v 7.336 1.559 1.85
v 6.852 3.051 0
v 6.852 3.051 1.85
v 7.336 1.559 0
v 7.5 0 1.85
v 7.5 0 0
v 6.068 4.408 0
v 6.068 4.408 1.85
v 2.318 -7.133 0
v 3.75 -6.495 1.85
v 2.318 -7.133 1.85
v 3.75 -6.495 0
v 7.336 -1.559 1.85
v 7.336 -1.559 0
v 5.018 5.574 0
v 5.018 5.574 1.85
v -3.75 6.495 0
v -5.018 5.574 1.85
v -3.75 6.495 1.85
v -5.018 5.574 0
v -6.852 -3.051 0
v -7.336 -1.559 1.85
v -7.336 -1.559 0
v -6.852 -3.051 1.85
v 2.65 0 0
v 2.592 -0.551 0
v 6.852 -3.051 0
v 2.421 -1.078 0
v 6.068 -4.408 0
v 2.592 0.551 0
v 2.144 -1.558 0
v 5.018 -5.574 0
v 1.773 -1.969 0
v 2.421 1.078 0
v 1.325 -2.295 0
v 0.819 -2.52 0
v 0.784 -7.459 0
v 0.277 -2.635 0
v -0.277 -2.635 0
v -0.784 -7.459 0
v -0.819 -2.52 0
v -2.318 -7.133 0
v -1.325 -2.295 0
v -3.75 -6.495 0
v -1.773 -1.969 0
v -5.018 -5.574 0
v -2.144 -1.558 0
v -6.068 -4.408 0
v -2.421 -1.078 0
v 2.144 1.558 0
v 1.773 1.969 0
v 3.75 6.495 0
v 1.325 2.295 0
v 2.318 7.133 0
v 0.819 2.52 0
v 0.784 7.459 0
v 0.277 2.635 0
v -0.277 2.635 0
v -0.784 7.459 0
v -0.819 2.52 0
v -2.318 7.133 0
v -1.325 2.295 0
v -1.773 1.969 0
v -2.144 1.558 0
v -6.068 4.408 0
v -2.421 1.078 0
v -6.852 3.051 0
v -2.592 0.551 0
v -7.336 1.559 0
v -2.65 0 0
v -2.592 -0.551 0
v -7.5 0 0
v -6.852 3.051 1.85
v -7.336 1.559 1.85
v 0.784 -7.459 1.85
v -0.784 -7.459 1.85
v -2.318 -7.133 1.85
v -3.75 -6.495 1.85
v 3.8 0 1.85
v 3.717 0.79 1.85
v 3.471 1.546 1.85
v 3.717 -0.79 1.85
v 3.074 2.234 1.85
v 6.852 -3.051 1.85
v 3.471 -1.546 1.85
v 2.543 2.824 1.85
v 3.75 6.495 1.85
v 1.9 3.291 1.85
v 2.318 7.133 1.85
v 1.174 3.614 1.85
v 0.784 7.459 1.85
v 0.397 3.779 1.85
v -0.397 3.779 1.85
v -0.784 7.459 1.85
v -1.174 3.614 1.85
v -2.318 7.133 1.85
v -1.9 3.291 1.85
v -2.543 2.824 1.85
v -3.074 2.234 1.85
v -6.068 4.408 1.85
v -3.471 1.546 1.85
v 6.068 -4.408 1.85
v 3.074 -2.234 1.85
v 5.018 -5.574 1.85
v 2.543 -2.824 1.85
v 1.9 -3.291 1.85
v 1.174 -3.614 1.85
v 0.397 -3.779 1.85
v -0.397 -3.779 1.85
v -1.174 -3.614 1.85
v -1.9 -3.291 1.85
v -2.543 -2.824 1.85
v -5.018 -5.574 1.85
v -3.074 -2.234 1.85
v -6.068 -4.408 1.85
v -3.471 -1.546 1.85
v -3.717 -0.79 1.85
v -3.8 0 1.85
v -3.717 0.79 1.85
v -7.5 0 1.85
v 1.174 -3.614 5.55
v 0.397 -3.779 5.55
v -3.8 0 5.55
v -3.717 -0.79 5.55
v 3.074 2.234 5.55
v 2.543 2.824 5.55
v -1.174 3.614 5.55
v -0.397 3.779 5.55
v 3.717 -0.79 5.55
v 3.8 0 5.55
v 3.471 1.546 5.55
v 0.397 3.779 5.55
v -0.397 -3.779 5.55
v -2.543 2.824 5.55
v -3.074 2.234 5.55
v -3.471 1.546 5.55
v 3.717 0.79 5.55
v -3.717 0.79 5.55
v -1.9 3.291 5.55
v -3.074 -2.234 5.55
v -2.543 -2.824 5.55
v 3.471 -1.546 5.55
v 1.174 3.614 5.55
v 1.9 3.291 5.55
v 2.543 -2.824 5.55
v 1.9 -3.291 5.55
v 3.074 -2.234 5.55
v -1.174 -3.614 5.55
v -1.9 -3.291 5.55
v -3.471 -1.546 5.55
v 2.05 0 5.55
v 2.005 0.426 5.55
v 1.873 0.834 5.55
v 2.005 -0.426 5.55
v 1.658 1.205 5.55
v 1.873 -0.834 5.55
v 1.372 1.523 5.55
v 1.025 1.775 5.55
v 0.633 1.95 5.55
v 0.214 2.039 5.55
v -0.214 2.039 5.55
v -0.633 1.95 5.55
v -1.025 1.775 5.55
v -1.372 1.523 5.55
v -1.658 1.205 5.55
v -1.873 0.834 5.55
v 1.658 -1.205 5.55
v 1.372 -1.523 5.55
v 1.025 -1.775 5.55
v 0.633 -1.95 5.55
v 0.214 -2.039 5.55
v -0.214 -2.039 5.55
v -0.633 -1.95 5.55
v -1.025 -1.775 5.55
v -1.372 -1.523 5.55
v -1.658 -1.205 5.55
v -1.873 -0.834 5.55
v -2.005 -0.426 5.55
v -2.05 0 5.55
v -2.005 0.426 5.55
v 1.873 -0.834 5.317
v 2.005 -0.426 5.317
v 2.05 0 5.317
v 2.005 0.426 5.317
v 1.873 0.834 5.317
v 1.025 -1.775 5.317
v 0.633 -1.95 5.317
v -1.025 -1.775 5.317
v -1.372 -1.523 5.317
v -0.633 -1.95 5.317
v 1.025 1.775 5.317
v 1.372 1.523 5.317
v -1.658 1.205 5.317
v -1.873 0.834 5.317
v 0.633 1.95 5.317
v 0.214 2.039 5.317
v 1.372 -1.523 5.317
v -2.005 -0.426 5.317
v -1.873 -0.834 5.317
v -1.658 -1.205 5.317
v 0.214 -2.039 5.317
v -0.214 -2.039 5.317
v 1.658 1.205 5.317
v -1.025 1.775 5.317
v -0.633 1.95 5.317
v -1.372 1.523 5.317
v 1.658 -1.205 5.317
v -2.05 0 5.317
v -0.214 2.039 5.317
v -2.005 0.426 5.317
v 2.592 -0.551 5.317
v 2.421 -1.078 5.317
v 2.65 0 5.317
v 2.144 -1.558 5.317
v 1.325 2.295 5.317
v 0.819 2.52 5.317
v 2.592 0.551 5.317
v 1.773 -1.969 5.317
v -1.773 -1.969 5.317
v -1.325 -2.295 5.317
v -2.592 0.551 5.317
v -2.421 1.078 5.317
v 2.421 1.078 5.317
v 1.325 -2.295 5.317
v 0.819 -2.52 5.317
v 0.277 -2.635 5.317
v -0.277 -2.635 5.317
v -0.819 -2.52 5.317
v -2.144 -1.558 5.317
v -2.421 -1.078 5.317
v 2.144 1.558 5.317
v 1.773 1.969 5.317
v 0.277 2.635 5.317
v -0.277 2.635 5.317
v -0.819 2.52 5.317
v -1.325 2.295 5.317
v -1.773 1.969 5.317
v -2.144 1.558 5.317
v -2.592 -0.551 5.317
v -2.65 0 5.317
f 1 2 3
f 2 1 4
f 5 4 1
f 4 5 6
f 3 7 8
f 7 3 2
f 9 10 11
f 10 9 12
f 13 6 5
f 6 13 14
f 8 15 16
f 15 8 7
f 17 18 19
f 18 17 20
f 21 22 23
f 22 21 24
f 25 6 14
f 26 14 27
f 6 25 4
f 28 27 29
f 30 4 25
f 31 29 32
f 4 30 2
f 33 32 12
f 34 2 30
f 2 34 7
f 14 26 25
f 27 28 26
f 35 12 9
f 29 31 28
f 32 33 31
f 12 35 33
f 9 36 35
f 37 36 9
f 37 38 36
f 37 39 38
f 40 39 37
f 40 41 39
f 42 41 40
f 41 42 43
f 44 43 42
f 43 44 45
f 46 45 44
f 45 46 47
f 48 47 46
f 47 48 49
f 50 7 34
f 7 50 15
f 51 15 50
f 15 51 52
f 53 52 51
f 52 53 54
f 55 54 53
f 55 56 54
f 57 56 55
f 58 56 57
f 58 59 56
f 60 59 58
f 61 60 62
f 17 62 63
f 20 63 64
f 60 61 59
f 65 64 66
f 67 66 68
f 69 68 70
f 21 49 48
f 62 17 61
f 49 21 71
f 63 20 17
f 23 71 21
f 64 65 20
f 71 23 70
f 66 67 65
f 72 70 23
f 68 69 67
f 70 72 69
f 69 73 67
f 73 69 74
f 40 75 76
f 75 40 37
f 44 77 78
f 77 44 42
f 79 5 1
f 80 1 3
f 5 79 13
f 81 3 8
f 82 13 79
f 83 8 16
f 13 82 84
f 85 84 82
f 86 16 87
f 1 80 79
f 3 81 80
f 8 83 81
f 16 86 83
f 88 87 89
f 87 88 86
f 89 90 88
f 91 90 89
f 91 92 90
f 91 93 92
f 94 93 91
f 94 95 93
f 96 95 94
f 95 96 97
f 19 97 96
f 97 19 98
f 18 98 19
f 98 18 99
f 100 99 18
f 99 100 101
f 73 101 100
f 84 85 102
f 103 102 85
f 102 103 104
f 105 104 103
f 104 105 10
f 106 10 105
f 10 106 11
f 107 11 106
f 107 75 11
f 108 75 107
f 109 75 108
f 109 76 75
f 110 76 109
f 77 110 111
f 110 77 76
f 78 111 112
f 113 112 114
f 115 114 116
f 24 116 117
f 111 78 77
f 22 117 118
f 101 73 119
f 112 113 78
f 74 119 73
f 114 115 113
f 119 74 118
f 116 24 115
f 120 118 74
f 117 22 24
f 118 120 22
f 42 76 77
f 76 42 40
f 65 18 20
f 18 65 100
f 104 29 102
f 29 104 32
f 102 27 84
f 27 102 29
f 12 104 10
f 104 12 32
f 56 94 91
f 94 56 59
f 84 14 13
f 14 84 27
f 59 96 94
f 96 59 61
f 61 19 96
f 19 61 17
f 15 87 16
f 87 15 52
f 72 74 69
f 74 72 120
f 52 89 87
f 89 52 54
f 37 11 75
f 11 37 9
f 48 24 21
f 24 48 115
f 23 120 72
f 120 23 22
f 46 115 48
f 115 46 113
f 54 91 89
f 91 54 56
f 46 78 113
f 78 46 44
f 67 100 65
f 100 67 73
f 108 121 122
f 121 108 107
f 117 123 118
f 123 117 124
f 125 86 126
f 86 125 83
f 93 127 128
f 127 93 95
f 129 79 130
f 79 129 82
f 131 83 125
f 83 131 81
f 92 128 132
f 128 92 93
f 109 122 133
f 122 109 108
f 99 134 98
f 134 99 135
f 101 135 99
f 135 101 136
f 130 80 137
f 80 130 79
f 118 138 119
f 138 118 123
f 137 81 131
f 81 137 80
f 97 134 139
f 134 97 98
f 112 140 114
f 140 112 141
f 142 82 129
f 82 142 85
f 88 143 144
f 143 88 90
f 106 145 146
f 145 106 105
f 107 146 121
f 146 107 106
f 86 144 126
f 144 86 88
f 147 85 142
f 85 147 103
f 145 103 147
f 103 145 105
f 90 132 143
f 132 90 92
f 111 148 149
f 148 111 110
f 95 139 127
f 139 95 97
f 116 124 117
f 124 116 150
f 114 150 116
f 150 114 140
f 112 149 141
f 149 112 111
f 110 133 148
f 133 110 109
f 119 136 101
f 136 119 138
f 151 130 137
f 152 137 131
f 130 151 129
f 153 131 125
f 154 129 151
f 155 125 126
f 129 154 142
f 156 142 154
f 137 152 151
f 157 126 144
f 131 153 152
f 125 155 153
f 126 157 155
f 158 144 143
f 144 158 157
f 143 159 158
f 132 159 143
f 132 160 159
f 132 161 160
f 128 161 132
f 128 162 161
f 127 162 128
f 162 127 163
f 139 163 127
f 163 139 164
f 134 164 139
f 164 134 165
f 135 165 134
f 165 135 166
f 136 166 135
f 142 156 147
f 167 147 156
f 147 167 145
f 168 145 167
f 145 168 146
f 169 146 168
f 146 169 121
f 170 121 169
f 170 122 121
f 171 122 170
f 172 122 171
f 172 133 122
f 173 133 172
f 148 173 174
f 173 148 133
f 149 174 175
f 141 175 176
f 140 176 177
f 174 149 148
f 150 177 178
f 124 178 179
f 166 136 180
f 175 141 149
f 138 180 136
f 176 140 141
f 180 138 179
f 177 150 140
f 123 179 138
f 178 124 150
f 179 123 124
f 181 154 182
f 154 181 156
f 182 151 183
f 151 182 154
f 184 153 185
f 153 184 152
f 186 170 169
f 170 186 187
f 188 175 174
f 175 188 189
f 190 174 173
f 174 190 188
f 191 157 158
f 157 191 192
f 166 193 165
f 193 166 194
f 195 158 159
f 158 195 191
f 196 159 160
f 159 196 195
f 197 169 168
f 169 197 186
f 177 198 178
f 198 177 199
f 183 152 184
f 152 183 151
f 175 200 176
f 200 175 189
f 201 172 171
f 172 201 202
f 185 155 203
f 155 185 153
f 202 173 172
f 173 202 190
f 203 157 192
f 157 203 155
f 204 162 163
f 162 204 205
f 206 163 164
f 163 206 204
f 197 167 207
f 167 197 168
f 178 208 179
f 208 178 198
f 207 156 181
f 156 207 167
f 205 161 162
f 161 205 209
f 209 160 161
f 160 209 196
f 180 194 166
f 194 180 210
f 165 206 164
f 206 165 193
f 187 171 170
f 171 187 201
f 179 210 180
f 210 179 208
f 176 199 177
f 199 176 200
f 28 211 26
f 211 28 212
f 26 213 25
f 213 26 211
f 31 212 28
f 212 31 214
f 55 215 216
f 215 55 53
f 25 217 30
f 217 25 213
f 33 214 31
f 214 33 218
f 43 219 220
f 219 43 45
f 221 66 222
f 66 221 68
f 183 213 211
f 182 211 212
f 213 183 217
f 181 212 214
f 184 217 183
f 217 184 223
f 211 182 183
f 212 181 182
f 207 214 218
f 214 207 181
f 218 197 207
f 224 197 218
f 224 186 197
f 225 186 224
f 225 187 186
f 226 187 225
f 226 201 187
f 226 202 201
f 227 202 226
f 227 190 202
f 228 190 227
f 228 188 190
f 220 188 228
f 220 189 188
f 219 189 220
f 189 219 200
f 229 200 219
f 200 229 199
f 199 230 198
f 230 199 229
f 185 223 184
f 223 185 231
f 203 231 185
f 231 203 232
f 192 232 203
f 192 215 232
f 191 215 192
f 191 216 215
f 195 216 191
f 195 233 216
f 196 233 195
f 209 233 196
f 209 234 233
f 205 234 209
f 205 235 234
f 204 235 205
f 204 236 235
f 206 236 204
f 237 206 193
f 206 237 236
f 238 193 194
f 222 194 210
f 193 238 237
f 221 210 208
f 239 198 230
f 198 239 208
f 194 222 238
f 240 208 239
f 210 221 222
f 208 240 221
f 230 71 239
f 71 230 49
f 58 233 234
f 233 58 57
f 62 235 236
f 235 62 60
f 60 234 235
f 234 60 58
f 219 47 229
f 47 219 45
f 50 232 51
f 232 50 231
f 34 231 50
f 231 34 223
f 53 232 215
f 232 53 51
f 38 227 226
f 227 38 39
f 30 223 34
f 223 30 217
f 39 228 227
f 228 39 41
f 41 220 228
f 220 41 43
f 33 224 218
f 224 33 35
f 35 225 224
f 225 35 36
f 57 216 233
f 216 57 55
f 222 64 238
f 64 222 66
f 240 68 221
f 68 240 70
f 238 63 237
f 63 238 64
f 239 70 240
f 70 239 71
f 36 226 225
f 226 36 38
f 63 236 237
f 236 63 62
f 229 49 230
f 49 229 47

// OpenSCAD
// file: ../Vitamins/Fasteners/ScrewsAsBolts/High_Low_Screw_As_Bolt_Vitamin.scad
//This is modelling a plastic screw being used as a bolt, and it's got a thicker bit so that it can slide through one side of the grip and then grab onto the other

function HiLoBoltOuterDiameter(3dPrinterTolerance=.4) = 4.5 + 3dPrinterTolerance*2;
function HiLoBoltDiameter(3dPrinterTolerance=.4)= 3.3 + 3dPrinterTolerance*2;
function HiLoBoltLength(3dPrinterTolerance=.4)= 22 + 3dPrinterTolerance;
function HiLoBoltHeadDiameter(3dPrinterTolerance=.4)= 6.7 + 3dPrinterTolerance*2;
function HiLoBoltHeadHeight(3dPrinterTolerance=.4)= 2.5 + 3dPrinterTolerance;

//err on the side of larger tolerances for bolts

module HiLoBolt(3dPrinterTolerance=.4, PlasticWidth=4.2)
{
	union()
	{
		translate([0,0,-HiLoBoltLength(3dPrinterTolerance)])
		{
			union()
			{
				cylinder(h=HiLoBoltLength(3dPrinterTolerance), r=HiLoBoltDiameter(3dPrinterTolerance)/2, $fn=30);
				translate([0,0,HiLoBoltLength(3dPrinterTolerance)-(PlasticWidth+2)])
				{
					cylinder(h=PlasticWidth+2, r=HiLoBoltOuterDiameter(3dPrinterTolerance)/2, $fn=30);
				}
			}
		}
		cylinder(h=HiLoBoltHeadHeight(3dPrinterTolerance), r=HiLoBoltHeadDiameter(3dPrinterTolerance)/2,$fn=30);
	}
}



HiLoBolt(.4,4.2);
// file: ../Vitamins/Structural/SealedBearings/SealedBearing608_Vitamin.scad
function 608BallBearingDiam(3dPrinterTolerance=.4) = 22+3dPrinterTolerance;
function 608BallBearingHeight(3dPrinterTolerance=.4) = 7+3dPrinterTolerance;
function 608BallBearingInnerDiam(3dPrinterTolerance=.4)= 8-3dPrinterTolerance;

function 608BallBearingAvgDiam(3dPrinterTolerance=.4)= (608BallBearingDiam(3dPrinterTolerance)+608BallBearingInnerDiam(3dPrinterTolerance))/2;


module 608BallBearing(3dPrinterTolerance=.4)
{
	union()
	{
		cylinder(608BallBearingHeight(3dPrinterTolerance), 608BallBearingDiam(3dPrinterTolerance)/2, 608BallBearingDiam(3dPrinterTolerance)/2, 0);
		%cylinder(608BallBearingHeight(3dPrinterTolerance), 608BallBearingInnerDiam(3dPrinterTolerance)/2, 608BallBearingInnerDiam(3dPrinterTolerance)/2);
	}
}

608BallBearing();
// main file
use <../Vitamins/Structural/SealedBearings/SealedBearing608_Vitamin.scad>
use <../Vitamins/Fasteners/ScrewsAsBolts/High_Low_Screw_As_Bolt_Vitamin.scad>

function IdlerBearingPlugPlasticWidth()= 608BallBearingHeight()/4;


module IdlerBearingPlugBolt()
{
	HiLoBolt(.4,608BallBearingHeight()/3+IdlerBearingPlugPlasticWidth());
}


module IdlerBearingPlug()
{
	difference()
	{
		union()
		{
			cylinder(h=IdlerBearingPlugPlasticWidth(), r=608BallBearingAvgDiam()/2, $fn=30);
			cylinder(h=608BallBearingHeight()/2+IdlerBearingPlugPlasticWidth(), r=608BallBearingInnerDiam()/2, $fn=30);
		}
		translate([0,0,-1])
		{
			rotate([180,0,0])
			{
				IdlerBearingPlugBolt();
			}
		}
	}
}

IdlerBearingPlug();
